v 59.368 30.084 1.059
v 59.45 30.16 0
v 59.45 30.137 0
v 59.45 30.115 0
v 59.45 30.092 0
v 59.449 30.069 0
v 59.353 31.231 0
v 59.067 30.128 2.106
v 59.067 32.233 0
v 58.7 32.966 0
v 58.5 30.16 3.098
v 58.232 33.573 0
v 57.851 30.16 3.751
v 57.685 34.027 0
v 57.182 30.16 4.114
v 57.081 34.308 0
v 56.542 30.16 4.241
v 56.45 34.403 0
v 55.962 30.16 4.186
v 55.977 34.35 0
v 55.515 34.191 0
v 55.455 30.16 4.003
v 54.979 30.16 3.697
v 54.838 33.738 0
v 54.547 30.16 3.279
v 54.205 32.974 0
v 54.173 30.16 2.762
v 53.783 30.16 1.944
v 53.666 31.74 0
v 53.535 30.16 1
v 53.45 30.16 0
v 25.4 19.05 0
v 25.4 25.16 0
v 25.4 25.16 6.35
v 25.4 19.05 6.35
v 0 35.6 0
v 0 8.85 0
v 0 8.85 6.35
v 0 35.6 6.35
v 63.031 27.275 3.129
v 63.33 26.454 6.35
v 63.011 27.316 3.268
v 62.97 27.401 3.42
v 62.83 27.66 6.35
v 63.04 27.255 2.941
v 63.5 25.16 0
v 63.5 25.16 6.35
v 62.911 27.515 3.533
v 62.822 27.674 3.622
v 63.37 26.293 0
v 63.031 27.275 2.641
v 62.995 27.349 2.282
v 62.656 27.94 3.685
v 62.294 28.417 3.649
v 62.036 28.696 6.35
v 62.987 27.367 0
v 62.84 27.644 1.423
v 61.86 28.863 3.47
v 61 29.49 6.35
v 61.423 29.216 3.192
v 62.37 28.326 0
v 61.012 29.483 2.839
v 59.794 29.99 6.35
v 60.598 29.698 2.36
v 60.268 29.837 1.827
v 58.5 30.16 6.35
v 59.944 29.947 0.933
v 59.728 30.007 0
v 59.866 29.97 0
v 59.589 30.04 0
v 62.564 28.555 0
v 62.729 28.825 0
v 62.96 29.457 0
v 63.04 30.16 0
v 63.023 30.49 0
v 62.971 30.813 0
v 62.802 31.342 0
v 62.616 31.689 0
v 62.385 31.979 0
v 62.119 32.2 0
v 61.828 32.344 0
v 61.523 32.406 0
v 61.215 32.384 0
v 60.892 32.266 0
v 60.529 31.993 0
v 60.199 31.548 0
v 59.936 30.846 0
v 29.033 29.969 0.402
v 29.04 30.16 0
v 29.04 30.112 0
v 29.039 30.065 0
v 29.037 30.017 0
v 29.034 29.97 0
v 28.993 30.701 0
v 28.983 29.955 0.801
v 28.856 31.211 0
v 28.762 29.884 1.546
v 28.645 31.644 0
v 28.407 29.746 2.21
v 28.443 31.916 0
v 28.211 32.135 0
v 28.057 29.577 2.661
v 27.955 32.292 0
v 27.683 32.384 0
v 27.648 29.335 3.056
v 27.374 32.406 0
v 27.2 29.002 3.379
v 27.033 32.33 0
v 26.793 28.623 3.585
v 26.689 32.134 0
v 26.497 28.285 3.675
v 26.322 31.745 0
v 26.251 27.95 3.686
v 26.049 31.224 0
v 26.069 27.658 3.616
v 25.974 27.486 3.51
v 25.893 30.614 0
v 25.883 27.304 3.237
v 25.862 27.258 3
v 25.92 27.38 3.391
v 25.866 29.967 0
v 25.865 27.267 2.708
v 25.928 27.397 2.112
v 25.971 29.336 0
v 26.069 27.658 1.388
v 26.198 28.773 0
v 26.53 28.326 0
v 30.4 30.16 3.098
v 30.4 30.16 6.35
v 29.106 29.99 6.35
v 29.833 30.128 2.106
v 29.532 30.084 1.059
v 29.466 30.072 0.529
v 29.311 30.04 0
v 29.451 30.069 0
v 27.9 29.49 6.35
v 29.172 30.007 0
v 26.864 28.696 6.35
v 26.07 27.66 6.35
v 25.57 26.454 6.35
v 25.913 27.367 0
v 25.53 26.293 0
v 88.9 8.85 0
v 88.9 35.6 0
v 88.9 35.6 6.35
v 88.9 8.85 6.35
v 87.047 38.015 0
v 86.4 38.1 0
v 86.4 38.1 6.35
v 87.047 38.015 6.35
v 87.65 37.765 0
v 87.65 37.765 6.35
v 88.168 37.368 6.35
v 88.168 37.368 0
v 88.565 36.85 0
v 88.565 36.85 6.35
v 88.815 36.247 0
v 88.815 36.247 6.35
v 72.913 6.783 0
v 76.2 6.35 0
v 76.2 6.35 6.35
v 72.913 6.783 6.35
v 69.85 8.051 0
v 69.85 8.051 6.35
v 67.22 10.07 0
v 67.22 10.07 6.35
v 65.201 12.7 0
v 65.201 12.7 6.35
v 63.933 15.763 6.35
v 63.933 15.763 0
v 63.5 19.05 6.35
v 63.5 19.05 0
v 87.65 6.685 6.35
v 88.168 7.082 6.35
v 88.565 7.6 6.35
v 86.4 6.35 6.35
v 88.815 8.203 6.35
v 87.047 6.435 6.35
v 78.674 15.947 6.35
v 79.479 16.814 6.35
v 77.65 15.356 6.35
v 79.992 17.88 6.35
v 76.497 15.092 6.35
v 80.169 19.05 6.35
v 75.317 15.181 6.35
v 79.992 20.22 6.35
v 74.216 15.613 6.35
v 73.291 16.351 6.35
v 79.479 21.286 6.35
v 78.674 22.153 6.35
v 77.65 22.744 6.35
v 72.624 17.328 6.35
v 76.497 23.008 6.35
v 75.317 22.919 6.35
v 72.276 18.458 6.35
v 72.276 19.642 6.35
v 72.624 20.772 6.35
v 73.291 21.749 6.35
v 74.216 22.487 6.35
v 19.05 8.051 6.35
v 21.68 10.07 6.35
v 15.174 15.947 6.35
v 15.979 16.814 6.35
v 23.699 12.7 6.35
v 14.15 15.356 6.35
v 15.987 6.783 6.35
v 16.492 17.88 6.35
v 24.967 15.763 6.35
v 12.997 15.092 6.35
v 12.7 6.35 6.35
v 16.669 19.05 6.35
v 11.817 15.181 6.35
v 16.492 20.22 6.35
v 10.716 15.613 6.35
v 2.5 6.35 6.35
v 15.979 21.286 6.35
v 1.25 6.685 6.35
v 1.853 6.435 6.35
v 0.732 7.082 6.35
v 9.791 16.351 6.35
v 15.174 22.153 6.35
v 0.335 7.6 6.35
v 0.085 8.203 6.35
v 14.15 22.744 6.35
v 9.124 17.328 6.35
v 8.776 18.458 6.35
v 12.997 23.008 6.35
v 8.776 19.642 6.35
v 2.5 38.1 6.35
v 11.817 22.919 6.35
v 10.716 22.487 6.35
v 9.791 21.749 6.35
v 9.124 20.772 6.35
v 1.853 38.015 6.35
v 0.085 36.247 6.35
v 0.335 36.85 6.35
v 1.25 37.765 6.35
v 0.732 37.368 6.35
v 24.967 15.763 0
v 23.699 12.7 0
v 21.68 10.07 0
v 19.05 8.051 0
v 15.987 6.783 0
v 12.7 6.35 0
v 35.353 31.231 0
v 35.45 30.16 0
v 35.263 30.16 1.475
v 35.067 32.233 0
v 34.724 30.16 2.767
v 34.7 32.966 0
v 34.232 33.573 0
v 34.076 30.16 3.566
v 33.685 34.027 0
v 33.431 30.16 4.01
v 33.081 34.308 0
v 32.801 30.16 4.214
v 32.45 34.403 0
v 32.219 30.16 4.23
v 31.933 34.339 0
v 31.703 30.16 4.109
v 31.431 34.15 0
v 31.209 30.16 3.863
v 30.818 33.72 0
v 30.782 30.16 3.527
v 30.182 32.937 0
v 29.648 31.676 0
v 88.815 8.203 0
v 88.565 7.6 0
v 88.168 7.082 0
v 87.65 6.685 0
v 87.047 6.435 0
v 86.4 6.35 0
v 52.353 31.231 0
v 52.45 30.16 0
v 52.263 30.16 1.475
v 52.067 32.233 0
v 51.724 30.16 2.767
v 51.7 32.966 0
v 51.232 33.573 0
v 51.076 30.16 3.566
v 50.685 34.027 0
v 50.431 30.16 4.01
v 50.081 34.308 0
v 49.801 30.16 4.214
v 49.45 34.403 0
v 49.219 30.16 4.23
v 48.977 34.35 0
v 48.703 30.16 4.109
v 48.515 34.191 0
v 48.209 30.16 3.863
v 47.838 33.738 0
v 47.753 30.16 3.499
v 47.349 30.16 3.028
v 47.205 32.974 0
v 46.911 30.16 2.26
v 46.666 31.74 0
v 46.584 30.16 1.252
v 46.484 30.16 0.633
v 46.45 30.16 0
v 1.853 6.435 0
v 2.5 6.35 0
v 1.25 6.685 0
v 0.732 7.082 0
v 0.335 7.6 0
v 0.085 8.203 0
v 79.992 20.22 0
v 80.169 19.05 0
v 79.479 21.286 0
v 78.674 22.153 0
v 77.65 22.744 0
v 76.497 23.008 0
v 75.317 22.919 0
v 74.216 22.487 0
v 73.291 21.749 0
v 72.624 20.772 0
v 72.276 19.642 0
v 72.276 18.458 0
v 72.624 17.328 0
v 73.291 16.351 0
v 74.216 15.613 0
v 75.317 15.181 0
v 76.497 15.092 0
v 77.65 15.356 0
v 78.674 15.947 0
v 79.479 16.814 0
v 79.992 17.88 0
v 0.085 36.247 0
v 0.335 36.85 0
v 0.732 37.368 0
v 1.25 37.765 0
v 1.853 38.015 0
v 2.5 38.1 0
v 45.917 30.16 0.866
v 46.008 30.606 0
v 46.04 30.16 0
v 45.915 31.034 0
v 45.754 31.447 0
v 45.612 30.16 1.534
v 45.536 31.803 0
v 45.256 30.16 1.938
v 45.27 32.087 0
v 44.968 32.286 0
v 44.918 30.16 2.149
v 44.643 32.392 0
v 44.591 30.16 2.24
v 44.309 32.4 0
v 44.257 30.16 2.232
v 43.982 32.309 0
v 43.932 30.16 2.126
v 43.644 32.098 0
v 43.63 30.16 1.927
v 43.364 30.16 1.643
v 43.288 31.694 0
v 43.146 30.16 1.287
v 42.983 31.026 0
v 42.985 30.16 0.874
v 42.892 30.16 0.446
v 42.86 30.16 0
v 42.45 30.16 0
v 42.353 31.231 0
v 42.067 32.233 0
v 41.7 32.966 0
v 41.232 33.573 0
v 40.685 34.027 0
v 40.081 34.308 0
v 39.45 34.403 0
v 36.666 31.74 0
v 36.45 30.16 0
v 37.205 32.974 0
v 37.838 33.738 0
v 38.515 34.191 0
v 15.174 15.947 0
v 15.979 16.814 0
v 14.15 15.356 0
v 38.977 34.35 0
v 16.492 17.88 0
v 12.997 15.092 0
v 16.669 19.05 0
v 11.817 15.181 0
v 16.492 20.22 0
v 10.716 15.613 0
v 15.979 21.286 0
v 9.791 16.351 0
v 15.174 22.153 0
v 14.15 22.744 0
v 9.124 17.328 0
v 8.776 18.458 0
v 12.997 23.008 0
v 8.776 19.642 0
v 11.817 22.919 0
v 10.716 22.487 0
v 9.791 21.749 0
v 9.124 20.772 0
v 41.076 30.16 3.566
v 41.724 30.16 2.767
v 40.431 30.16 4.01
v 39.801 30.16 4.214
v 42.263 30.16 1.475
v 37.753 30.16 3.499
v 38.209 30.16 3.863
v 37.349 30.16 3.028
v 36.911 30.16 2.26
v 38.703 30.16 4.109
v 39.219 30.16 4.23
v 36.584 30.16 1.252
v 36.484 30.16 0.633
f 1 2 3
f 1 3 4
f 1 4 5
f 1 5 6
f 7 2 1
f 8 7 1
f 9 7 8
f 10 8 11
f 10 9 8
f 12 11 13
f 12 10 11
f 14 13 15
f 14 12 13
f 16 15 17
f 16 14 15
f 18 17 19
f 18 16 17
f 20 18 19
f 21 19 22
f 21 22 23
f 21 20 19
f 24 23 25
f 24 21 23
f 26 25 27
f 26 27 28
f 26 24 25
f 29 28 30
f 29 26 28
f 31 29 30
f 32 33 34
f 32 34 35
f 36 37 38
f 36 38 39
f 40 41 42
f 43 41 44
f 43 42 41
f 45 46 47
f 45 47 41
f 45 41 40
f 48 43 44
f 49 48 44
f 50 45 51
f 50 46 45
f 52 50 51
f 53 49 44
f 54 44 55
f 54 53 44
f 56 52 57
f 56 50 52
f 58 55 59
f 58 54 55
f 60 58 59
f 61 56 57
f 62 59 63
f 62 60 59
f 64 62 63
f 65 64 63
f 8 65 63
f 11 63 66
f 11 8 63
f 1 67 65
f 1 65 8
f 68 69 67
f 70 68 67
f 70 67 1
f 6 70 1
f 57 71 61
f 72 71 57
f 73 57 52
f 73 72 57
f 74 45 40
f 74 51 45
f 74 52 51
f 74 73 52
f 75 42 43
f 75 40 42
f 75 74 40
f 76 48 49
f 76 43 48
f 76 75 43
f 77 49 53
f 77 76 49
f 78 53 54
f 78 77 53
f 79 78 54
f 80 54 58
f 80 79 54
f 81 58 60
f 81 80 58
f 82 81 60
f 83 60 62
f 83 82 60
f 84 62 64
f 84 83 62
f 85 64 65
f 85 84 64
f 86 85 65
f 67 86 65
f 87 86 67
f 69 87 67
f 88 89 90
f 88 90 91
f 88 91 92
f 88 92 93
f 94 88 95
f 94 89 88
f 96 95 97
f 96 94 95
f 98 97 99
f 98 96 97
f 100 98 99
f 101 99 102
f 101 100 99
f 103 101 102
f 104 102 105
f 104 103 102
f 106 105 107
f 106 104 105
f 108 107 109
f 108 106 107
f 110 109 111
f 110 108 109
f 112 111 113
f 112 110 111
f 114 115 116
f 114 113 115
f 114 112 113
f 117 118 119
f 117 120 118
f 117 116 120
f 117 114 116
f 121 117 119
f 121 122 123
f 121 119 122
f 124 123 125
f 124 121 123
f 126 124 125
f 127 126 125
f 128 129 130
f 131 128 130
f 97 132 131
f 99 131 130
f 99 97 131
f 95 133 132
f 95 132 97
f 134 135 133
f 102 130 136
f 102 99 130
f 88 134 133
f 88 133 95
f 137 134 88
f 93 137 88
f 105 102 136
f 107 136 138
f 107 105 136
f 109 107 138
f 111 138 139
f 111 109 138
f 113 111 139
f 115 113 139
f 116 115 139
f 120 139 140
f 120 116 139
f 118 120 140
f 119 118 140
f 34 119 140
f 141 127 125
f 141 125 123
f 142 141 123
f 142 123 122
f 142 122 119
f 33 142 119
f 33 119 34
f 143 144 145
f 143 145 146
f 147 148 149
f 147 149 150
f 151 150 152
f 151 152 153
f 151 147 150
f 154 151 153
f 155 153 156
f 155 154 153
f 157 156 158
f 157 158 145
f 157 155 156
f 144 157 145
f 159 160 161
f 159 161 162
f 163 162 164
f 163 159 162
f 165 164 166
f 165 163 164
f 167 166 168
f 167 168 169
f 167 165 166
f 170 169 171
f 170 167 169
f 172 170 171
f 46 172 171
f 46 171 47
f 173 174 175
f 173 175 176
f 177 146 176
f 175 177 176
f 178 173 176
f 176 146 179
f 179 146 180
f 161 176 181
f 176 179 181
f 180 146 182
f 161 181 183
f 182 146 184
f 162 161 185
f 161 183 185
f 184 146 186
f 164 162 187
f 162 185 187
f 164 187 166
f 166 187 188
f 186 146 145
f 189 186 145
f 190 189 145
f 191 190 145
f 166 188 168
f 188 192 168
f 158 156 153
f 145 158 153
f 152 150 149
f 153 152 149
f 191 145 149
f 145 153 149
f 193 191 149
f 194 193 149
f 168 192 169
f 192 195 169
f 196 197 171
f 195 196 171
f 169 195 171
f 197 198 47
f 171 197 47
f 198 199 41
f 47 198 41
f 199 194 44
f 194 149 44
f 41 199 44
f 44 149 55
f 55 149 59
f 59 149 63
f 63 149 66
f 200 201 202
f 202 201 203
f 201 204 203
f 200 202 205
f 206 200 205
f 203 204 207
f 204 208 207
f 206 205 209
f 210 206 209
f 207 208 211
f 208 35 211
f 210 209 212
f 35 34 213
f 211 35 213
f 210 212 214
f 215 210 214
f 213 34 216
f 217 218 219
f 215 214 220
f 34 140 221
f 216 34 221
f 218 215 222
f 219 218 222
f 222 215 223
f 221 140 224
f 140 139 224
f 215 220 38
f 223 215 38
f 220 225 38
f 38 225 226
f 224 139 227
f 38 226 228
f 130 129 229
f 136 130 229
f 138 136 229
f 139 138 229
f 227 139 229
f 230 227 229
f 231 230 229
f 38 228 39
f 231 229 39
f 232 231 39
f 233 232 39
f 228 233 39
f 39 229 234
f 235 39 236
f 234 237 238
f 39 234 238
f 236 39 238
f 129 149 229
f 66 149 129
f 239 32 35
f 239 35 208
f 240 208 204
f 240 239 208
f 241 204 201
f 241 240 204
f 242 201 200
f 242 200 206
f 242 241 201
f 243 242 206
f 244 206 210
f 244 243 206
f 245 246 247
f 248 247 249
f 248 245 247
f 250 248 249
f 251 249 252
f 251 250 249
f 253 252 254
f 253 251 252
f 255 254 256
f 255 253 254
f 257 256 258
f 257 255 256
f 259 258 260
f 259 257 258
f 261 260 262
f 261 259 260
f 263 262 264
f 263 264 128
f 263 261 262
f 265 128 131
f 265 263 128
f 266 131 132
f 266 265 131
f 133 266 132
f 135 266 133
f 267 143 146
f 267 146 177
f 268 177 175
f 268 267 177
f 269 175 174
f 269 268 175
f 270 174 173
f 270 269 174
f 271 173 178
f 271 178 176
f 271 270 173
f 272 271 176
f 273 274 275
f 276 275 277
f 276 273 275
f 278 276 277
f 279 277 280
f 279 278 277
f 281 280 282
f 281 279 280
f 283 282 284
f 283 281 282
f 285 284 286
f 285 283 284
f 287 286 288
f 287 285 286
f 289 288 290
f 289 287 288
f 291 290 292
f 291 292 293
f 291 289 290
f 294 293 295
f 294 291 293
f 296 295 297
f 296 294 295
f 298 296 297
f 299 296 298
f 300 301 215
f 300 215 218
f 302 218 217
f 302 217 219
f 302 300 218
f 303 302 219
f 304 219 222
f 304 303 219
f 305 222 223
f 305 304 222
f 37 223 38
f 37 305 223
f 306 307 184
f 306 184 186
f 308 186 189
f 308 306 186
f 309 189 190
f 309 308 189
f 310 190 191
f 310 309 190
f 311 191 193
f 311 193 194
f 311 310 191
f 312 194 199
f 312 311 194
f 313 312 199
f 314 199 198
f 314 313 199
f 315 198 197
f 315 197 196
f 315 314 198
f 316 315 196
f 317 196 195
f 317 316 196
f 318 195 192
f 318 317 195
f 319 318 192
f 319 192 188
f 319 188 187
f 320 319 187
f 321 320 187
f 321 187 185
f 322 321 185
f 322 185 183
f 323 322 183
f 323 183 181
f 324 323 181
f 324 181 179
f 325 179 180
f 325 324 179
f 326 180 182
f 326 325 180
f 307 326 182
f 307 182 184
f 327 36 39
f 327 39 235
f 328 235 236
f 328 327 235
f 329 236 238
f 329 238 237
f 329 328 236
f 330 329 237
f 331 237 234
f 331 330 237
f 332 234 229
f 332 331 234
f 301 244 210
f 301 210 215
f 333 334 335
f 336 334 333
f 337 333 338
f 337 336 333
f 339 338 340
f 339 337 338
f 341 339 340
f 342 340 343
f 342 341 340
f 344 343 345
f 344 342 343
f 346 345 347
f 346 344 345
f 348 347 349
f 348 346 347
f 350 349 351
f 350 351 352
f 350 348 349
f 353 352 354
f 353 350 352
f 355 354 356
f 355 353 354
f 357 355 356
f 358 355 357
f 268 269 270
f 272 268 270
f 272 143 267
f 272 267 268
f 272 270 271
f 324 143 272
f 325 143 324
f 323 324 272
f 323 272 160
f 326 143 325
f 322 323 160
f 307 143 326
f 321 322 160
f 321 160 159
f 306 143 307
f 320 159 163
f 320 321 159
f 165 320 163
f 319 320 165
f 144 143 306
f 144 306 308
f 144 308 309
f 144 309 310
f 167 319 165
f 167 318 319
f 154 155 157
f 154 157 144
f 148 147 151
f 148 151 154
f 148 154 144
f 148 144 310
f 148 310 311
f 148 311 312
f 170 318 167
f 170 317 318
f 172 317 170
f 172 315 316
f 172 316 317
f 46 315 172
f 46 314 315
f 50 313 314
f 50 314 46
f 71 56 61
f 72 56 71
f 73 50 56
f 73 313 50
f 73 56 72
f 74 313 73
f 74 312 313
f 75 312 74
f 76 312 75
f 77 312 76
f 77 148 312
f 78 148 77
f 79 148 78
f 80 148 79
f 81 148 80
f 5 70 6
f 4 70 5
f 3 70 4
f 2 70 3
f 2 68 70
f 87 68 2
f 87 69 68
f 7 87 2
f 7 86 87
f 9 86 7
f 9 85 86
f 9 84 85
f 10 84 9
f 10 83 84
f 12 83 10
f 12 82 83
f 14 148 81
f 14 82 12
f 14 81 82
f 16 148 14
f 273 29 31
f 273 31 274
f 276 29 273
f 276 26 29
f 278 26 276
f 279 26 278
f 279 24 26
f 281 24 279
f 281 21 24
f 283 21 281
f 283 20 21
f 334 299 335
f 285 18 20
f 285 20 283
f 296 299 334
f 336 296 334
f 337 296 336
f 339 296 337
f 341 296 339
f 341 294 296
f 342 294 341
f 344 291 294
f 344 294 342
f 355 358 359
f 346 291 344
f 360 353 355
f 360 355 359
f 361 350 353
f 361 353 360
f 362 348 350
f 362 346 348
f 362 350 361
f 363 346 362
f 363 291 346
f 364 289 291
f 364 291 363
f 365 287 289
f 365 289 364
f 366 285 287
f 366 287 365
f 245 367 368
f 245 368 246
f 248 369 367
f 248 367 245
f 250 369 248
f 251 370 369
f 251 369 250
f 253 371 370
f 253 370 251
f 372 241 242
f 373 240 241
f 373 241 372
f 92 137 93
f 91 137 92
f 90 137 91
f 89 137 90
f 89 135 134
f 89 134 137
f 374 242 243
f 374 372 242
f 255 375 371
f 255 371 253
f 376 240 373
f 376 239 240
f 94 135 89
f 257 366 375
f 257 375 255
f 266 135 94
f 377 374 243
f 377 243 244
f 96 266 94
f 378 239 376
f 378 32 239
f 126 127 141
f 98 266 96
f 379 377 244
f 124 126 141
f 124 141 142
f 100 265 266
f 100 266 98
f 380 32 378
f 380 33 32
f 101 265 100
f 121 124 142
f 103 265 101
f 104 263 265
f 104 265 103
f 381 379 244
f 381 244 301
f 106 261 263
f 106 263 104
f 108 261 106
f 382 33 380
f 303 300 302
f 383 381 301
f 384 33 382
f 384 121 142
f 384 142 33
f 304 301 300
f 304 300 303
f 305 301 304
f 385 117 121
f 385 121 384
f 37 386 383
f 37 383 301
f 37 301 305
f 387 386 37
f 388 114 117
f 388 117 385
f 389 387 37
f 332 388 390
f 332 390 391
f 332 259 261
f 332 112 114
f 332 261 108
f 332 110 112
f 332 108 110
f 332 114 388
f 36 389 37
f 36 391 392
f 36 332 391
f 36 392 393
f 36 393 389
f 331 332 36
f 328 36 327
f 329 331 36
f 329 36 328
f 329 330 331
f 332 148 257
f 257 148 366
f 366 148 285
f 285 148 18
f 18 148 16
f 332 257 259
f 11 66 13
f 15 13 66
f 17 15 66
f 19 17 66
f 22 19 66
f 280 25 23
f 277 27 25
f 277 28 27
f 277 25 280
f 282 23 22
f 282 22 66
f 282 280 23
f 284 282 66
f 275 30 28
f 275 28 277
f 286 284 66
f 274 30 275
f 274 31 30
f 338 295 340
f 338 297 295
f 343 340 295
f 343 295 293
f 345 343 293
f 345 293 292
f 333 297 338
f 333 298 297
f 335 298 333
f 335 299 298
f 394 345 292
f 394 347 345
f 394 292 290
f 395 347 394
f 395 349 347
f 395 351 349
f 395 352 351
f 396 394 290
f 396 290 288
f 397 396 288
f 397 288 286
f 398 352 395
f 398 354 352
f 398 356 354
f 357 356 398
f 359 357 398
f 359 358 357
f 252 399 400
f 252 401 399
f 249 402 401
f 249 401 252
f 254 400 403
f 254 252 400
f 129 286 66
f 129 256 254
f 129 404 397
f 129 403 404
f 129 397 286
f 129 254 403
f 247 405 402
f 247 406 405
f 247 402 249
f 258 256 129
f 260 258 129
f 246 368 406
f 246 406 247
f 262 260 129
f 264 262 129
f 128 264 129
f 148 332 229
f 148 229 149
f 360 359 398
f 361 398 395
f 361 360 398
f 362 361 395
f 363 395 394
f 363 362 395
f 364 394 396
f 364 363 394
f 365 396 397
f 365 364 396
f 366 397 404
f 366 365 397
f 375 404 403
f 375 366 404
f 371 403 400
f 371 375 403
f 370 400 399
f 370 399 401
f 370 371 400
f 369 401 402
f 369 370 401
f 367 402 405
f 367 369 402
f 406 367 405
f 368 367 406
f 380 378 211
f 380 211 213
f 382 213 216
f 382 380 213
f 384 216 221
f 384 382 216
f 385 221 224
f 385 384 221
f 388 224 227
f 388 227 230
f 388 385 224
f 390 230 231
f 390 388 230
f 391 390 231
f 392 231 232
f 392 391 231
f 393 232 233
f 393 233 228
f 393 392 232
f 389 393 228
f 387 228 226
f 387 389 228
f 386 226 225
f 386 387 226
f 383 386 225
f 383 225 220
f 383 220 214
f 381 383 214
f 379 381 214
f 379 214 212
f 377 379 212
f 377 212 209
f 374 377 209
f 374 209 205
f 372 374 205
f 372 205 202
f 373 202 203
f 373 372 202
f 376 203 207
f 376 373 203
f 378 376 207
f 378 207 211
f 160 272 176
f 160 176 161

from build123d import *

# Parameters (mm, degrees)
SKETCH2_R               = 3.96875
BOSS_EXTRUDE1_DEPTH     = 6.35
CUT_EXTRUDE1_DEPTH      = 95.292689271
CUT_EXTRUDE1_DEPTH_BACK = 95.292689271
SKETCH3_R               = 3
SKETCH3_R_2             = 1.59


with BuildPart() as part:
    # Sketch2 → Boss-Extrude1 (new body)
    with BuildSketch(Plane.XY):
        with BuildLine():
            Line((2.5, 38.1), (86.4, 38.1))
            ThreePointArc((86.4, 38.1), (88.167766953, 37.367766953), (88.9, 35.6))
            Line((88.9, 35.6), (88.9, 8.85))
            ThreePointArc((88.9, 8.85), (88.167766953, 7.082233047), (86.4, 6.35))
            Line((86.4, 6.35), (76.2, 6.35))
            ThreePointArc((76.2, 6.35), (67.219743879, 10.069743879), (63.5, 19.05))
            Line((63.5, 19.05), (63.5, 25.16))
            ThreePointArc((63.5, 25.16), (62.035533906, 28.695533906), (58.5, 30.16))
            Line((58.5, 30.16), (30.4, 30.16))
            ThreePointArc((30.4, 30.16), (26.864466094, 28.695533906), (25.4, 25.16))
            Line((25.4, 25.16), (25.4, 19.05))
            ThreePointArc((25.4, 19.05), (21.680256121, 10.069743879), (12.7, 6.35))
            Line((12.7, 6.35), (2.5, 6.35))
            ThreePointArc((2.5, 6.35), (0.732233047, 7.082233047), (0, 8.85))
            Line((0, 8.85), (0, 35.6))
            ThreePointArc((0, 35.6), (0.732233047, 37.367766953), (2.5, 38.1))
        make_face()
        with Locations((12.7, 19.05)):
            Circle(SKETCH2_R, mode=Mode.SUBTRACT)
        with Locations((76.2, 19.05)):
            Circle(SKETCH2_R, mode=Mode.SUBTRACT)
    extrude(amount=BOSS_EXTRUDE1_DEPTH)

    # Sketch3 → Cut-Extrude1 (cut, two sides: drawn at the far end of the back side and taken through both)
    with BuildSketch(Plane(origin=(0, 15.875, -15.875), x_dir=(1, 0, 0), z_dir=(0, -0.7071067811865475, 0.7071067811865477)).offset(-CUT_EXTRUDE1_DEPTH_BACK)):
        with Locations((56.45, 21.326340521)):
            Circle(SKETCH3_R)
        with Locations((49.45, 21.326340521)):
            Circle(SKETCH3_R)
        with Locations((44.45, 21.326340521)):
            Circle(SKETCH3_R_2)
        with Locations((39.45, 21.326340521)):
            Circle(SKETCH3_R)
        with Locations((32.45, 21.326340521)):
            Circle(SKETCH3_R)
        with Locations((61.45, 21.326340521)):
            Circle(SKETCH3_R_2)
        with Locations((27.45, 21.326340521)):
            Circle(SKETCH3_R_2)
    extrude(amount=CUT_EXTRUDE1_DEPTH + CUT_EXTRUDE1_DEPTH_BACK, mode=Mode.SUBTRACT)


solid = part.part
